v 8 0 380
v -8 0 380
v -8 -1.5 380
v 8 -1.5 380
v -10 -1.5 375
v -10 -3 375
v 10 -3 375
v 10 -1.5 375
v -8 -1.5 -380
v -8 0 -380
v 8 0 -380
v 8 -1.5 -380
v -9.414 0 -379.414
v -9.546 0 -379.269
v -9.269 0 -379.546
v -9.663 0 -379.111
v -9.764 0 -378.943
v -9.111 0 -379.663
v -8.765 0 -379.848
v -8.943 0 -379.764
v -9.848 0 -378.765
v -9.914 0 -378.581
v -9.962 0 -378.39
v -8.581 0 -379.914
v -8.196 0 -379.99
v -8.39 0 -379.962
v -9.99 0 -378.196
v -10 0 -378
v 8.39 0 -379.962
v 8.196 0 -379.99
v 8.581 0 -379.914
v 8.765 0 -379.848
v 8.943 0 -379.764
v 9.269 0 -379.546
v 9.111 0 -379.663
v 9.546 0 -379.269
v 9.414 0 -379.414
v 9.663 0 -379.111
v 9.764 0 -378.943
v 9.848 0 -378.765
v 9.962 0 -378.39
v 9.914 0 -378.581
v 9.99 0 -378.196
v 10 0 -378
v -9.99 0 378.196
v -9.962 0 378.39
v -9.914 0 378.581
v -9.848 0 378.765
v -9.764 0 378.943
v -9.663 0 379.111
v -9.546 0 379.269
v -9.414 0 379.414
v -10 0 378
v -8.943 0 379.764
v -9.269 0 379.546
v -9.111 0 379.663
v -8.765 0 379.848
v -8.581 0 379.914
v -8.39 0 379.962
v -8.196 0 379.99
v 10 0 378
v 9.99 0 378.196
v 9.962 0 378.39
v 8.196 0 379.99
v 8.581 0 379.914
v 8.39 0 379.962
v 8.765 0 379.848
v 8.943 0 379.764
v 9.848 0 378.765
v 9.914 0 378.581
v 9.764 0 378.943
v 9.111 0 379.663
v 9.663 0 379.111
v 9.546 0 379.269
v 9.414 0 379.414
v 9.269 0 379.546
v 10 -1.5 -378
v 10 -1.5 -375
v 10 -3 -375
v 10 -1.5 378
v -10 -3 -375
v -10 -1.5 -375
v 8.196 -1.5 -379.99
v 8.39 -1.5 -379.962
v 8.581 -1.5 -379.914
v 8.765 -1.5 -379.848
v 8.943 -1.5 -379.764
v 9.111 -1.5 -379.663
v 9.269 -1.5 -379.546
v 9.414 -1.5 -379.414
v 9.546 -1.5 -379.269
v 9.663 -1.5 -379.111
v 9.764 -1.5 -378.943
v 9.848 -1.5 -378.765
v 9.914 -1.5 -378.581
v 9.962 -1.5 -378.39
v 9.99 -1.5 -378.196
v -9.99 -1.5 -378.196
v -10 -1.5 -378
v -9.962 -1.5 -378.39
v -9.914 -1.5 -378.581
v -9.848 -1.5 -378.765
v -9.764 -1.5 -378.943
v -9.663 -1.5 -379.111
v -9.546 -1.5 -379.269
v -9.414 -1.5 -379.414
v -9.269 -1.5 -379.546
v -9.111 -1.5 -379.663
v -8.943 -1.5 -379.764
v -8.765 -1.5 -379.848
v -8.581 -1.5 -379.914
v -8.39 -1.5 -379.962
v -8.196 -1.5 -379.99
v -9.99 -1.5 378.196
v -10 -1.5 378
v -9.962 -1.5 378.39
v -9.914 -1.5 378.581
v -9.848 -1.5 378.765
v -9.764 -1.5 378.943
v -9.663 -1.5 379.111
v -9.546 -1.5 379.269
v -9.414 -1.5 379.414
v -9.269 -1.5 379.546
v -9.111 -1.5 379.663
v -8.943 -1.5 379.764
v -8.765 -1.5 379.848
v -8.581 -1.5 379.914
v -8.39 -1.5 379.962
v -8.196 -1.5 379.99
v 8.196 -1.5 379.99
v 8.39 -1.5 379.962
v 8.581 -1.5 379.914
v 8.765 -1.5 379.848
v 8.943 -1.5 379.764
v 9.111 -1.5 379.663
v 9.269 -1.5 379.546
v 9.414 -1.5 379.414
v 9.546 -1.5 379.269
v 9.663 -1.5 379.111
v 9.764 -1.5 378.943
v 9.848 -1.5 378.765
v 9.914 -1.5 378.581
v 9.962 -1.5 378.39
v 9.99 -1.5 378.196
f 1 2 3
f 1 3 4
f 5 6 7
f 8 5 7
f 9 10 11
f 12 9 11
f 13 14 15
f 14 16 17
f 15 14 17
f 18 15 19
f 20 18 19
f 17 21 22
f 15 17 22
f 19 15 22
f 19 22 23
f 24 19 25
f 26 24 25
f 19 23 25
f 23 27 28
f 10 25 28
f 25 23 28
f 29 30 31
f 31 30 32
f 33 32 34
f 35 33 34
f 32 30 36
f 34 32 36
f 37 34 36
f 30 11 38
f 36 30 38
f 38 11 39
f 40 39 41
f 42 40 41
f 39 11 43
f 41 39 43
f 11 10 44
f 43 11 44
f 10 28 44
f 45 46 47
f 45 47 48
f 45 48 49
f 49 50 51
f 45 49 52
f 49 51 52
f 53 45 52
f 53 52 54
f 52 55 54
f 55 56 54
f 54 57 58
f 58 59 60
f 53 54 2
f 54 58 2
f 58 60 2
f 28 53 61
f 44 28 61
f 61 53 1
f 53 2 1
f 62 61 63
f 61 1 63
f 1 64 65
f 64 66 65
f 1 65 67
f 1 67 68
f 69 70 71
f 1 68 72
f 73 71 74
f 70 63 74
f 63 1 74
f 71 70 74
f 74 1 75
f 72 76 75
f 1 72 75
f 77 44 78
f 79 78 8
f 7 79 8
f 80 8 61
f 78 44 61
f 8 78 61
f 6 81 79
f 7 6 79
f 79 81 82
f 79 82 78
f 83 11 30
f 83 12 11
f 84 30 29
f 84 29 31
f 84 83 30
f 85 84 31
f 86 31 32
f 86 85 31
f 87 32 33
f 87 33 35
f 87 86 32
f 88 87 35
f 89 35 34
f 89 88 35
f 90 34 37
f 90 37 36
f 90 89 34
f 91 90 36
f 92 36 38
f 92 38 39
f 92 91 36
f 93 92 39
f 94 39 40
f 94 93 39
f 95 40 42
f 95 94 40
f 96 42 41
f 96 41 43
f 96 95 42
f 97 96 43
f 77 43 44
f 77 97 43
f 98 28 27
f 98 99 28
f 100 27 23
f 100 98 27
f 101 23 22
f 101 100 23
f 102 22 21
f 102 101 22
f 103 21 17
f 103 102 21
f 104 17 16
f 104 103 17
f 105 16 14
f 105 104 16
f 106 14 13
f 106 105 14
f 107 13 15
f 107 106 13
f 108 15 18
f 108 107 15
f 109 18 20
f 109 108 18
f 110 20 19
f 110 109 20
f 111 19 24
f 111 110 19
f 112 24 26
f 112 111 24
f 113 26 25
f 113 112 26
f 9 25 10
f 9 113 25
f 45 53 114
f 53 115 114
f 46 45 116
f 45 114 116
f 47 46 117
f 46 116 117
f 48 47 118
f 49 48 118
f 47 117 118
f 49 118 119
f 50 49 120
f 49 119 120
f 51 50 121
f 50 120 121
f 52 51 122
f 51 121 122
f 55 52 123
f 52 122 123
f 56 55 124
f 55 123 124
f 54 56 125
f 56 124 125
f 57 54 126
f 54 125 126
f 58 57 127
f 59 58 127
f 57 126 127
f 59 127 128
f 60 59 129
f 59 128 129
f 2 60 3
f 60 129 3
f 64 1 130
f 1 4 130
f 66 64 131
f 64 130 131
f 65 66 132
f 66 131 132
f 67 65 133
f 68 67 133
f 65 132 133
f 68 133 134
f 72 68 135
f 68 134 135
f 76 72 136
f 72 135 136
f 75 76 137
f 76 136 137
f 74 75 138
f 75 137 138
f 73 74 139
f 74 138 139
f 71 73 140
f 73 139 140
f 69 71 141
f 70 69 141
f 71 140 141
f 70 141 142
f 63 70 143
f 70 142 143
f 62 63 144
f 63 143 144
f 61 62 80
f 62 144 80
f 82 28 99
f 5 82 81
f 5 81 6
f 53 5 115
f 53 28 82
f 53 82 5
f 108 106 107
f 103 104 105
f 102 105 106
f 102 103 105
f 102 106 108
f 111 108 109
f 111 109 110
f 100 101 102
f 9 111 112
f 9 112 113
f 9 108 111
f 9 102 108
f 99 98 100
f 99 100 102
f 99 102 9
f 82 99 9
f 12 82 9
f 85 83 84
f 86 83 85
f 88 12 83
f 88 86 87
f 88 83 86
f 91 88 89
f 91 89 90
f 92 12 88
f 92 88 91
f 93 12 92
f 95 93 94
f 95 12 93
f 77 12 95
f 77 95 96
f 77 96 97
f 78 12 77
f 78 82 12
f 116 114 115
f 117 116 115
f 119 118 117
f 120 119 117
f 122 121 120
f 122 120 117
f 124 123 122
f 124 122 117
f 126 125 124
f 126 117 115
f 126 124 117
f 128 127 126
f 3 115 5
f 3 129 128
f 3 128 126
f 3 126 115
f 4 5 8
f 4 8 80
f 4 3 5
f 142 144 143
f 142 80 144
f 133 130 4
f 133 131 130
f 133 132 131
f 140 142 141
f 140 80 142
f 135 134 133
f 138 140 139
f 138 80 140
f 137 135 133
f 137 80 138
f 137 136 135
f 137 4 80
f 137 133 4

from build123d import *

# Parameters (mm, degrees)
F0_W     = 20
F0_H     = 760
F1_DEPTH = 3
F2_W     = 20
F2_H     = 5
F3_DEPTH = 1.5
F4_R     = 2


with BuildPart() as f1:
    # F0 (on Front) → F1 (new body)
    with BuildSketch(Plane.XZ):
        Rectangle(F0_W, F0_H)
    extrude(amount=F1_DEPTH)

    # F2 (on face) → F3 (cut)
    with BuildSketch(Plane.XZ.offset(3)):
        with Locations((0, 377.5)):
            Rectangle(F2_W, F2_H)
        with Locations((0, -377.5)):
            Rectangle(F2_W, F2_H)
    extrude(amount=-F3_DEPTH, mode=Mode.SUBTRACT)

    # F4
    f4_edges = [f1.edges().sort_by_distance(p)[0] for p in [
        (10, -0.75, -380),
        (-10, -0.75, -380),
        (-10, -0.75, 380),
        (10, -0.75, 380),
    ]]
    fillet(f4_edges, radius=F4_R)


solid = f1.part
